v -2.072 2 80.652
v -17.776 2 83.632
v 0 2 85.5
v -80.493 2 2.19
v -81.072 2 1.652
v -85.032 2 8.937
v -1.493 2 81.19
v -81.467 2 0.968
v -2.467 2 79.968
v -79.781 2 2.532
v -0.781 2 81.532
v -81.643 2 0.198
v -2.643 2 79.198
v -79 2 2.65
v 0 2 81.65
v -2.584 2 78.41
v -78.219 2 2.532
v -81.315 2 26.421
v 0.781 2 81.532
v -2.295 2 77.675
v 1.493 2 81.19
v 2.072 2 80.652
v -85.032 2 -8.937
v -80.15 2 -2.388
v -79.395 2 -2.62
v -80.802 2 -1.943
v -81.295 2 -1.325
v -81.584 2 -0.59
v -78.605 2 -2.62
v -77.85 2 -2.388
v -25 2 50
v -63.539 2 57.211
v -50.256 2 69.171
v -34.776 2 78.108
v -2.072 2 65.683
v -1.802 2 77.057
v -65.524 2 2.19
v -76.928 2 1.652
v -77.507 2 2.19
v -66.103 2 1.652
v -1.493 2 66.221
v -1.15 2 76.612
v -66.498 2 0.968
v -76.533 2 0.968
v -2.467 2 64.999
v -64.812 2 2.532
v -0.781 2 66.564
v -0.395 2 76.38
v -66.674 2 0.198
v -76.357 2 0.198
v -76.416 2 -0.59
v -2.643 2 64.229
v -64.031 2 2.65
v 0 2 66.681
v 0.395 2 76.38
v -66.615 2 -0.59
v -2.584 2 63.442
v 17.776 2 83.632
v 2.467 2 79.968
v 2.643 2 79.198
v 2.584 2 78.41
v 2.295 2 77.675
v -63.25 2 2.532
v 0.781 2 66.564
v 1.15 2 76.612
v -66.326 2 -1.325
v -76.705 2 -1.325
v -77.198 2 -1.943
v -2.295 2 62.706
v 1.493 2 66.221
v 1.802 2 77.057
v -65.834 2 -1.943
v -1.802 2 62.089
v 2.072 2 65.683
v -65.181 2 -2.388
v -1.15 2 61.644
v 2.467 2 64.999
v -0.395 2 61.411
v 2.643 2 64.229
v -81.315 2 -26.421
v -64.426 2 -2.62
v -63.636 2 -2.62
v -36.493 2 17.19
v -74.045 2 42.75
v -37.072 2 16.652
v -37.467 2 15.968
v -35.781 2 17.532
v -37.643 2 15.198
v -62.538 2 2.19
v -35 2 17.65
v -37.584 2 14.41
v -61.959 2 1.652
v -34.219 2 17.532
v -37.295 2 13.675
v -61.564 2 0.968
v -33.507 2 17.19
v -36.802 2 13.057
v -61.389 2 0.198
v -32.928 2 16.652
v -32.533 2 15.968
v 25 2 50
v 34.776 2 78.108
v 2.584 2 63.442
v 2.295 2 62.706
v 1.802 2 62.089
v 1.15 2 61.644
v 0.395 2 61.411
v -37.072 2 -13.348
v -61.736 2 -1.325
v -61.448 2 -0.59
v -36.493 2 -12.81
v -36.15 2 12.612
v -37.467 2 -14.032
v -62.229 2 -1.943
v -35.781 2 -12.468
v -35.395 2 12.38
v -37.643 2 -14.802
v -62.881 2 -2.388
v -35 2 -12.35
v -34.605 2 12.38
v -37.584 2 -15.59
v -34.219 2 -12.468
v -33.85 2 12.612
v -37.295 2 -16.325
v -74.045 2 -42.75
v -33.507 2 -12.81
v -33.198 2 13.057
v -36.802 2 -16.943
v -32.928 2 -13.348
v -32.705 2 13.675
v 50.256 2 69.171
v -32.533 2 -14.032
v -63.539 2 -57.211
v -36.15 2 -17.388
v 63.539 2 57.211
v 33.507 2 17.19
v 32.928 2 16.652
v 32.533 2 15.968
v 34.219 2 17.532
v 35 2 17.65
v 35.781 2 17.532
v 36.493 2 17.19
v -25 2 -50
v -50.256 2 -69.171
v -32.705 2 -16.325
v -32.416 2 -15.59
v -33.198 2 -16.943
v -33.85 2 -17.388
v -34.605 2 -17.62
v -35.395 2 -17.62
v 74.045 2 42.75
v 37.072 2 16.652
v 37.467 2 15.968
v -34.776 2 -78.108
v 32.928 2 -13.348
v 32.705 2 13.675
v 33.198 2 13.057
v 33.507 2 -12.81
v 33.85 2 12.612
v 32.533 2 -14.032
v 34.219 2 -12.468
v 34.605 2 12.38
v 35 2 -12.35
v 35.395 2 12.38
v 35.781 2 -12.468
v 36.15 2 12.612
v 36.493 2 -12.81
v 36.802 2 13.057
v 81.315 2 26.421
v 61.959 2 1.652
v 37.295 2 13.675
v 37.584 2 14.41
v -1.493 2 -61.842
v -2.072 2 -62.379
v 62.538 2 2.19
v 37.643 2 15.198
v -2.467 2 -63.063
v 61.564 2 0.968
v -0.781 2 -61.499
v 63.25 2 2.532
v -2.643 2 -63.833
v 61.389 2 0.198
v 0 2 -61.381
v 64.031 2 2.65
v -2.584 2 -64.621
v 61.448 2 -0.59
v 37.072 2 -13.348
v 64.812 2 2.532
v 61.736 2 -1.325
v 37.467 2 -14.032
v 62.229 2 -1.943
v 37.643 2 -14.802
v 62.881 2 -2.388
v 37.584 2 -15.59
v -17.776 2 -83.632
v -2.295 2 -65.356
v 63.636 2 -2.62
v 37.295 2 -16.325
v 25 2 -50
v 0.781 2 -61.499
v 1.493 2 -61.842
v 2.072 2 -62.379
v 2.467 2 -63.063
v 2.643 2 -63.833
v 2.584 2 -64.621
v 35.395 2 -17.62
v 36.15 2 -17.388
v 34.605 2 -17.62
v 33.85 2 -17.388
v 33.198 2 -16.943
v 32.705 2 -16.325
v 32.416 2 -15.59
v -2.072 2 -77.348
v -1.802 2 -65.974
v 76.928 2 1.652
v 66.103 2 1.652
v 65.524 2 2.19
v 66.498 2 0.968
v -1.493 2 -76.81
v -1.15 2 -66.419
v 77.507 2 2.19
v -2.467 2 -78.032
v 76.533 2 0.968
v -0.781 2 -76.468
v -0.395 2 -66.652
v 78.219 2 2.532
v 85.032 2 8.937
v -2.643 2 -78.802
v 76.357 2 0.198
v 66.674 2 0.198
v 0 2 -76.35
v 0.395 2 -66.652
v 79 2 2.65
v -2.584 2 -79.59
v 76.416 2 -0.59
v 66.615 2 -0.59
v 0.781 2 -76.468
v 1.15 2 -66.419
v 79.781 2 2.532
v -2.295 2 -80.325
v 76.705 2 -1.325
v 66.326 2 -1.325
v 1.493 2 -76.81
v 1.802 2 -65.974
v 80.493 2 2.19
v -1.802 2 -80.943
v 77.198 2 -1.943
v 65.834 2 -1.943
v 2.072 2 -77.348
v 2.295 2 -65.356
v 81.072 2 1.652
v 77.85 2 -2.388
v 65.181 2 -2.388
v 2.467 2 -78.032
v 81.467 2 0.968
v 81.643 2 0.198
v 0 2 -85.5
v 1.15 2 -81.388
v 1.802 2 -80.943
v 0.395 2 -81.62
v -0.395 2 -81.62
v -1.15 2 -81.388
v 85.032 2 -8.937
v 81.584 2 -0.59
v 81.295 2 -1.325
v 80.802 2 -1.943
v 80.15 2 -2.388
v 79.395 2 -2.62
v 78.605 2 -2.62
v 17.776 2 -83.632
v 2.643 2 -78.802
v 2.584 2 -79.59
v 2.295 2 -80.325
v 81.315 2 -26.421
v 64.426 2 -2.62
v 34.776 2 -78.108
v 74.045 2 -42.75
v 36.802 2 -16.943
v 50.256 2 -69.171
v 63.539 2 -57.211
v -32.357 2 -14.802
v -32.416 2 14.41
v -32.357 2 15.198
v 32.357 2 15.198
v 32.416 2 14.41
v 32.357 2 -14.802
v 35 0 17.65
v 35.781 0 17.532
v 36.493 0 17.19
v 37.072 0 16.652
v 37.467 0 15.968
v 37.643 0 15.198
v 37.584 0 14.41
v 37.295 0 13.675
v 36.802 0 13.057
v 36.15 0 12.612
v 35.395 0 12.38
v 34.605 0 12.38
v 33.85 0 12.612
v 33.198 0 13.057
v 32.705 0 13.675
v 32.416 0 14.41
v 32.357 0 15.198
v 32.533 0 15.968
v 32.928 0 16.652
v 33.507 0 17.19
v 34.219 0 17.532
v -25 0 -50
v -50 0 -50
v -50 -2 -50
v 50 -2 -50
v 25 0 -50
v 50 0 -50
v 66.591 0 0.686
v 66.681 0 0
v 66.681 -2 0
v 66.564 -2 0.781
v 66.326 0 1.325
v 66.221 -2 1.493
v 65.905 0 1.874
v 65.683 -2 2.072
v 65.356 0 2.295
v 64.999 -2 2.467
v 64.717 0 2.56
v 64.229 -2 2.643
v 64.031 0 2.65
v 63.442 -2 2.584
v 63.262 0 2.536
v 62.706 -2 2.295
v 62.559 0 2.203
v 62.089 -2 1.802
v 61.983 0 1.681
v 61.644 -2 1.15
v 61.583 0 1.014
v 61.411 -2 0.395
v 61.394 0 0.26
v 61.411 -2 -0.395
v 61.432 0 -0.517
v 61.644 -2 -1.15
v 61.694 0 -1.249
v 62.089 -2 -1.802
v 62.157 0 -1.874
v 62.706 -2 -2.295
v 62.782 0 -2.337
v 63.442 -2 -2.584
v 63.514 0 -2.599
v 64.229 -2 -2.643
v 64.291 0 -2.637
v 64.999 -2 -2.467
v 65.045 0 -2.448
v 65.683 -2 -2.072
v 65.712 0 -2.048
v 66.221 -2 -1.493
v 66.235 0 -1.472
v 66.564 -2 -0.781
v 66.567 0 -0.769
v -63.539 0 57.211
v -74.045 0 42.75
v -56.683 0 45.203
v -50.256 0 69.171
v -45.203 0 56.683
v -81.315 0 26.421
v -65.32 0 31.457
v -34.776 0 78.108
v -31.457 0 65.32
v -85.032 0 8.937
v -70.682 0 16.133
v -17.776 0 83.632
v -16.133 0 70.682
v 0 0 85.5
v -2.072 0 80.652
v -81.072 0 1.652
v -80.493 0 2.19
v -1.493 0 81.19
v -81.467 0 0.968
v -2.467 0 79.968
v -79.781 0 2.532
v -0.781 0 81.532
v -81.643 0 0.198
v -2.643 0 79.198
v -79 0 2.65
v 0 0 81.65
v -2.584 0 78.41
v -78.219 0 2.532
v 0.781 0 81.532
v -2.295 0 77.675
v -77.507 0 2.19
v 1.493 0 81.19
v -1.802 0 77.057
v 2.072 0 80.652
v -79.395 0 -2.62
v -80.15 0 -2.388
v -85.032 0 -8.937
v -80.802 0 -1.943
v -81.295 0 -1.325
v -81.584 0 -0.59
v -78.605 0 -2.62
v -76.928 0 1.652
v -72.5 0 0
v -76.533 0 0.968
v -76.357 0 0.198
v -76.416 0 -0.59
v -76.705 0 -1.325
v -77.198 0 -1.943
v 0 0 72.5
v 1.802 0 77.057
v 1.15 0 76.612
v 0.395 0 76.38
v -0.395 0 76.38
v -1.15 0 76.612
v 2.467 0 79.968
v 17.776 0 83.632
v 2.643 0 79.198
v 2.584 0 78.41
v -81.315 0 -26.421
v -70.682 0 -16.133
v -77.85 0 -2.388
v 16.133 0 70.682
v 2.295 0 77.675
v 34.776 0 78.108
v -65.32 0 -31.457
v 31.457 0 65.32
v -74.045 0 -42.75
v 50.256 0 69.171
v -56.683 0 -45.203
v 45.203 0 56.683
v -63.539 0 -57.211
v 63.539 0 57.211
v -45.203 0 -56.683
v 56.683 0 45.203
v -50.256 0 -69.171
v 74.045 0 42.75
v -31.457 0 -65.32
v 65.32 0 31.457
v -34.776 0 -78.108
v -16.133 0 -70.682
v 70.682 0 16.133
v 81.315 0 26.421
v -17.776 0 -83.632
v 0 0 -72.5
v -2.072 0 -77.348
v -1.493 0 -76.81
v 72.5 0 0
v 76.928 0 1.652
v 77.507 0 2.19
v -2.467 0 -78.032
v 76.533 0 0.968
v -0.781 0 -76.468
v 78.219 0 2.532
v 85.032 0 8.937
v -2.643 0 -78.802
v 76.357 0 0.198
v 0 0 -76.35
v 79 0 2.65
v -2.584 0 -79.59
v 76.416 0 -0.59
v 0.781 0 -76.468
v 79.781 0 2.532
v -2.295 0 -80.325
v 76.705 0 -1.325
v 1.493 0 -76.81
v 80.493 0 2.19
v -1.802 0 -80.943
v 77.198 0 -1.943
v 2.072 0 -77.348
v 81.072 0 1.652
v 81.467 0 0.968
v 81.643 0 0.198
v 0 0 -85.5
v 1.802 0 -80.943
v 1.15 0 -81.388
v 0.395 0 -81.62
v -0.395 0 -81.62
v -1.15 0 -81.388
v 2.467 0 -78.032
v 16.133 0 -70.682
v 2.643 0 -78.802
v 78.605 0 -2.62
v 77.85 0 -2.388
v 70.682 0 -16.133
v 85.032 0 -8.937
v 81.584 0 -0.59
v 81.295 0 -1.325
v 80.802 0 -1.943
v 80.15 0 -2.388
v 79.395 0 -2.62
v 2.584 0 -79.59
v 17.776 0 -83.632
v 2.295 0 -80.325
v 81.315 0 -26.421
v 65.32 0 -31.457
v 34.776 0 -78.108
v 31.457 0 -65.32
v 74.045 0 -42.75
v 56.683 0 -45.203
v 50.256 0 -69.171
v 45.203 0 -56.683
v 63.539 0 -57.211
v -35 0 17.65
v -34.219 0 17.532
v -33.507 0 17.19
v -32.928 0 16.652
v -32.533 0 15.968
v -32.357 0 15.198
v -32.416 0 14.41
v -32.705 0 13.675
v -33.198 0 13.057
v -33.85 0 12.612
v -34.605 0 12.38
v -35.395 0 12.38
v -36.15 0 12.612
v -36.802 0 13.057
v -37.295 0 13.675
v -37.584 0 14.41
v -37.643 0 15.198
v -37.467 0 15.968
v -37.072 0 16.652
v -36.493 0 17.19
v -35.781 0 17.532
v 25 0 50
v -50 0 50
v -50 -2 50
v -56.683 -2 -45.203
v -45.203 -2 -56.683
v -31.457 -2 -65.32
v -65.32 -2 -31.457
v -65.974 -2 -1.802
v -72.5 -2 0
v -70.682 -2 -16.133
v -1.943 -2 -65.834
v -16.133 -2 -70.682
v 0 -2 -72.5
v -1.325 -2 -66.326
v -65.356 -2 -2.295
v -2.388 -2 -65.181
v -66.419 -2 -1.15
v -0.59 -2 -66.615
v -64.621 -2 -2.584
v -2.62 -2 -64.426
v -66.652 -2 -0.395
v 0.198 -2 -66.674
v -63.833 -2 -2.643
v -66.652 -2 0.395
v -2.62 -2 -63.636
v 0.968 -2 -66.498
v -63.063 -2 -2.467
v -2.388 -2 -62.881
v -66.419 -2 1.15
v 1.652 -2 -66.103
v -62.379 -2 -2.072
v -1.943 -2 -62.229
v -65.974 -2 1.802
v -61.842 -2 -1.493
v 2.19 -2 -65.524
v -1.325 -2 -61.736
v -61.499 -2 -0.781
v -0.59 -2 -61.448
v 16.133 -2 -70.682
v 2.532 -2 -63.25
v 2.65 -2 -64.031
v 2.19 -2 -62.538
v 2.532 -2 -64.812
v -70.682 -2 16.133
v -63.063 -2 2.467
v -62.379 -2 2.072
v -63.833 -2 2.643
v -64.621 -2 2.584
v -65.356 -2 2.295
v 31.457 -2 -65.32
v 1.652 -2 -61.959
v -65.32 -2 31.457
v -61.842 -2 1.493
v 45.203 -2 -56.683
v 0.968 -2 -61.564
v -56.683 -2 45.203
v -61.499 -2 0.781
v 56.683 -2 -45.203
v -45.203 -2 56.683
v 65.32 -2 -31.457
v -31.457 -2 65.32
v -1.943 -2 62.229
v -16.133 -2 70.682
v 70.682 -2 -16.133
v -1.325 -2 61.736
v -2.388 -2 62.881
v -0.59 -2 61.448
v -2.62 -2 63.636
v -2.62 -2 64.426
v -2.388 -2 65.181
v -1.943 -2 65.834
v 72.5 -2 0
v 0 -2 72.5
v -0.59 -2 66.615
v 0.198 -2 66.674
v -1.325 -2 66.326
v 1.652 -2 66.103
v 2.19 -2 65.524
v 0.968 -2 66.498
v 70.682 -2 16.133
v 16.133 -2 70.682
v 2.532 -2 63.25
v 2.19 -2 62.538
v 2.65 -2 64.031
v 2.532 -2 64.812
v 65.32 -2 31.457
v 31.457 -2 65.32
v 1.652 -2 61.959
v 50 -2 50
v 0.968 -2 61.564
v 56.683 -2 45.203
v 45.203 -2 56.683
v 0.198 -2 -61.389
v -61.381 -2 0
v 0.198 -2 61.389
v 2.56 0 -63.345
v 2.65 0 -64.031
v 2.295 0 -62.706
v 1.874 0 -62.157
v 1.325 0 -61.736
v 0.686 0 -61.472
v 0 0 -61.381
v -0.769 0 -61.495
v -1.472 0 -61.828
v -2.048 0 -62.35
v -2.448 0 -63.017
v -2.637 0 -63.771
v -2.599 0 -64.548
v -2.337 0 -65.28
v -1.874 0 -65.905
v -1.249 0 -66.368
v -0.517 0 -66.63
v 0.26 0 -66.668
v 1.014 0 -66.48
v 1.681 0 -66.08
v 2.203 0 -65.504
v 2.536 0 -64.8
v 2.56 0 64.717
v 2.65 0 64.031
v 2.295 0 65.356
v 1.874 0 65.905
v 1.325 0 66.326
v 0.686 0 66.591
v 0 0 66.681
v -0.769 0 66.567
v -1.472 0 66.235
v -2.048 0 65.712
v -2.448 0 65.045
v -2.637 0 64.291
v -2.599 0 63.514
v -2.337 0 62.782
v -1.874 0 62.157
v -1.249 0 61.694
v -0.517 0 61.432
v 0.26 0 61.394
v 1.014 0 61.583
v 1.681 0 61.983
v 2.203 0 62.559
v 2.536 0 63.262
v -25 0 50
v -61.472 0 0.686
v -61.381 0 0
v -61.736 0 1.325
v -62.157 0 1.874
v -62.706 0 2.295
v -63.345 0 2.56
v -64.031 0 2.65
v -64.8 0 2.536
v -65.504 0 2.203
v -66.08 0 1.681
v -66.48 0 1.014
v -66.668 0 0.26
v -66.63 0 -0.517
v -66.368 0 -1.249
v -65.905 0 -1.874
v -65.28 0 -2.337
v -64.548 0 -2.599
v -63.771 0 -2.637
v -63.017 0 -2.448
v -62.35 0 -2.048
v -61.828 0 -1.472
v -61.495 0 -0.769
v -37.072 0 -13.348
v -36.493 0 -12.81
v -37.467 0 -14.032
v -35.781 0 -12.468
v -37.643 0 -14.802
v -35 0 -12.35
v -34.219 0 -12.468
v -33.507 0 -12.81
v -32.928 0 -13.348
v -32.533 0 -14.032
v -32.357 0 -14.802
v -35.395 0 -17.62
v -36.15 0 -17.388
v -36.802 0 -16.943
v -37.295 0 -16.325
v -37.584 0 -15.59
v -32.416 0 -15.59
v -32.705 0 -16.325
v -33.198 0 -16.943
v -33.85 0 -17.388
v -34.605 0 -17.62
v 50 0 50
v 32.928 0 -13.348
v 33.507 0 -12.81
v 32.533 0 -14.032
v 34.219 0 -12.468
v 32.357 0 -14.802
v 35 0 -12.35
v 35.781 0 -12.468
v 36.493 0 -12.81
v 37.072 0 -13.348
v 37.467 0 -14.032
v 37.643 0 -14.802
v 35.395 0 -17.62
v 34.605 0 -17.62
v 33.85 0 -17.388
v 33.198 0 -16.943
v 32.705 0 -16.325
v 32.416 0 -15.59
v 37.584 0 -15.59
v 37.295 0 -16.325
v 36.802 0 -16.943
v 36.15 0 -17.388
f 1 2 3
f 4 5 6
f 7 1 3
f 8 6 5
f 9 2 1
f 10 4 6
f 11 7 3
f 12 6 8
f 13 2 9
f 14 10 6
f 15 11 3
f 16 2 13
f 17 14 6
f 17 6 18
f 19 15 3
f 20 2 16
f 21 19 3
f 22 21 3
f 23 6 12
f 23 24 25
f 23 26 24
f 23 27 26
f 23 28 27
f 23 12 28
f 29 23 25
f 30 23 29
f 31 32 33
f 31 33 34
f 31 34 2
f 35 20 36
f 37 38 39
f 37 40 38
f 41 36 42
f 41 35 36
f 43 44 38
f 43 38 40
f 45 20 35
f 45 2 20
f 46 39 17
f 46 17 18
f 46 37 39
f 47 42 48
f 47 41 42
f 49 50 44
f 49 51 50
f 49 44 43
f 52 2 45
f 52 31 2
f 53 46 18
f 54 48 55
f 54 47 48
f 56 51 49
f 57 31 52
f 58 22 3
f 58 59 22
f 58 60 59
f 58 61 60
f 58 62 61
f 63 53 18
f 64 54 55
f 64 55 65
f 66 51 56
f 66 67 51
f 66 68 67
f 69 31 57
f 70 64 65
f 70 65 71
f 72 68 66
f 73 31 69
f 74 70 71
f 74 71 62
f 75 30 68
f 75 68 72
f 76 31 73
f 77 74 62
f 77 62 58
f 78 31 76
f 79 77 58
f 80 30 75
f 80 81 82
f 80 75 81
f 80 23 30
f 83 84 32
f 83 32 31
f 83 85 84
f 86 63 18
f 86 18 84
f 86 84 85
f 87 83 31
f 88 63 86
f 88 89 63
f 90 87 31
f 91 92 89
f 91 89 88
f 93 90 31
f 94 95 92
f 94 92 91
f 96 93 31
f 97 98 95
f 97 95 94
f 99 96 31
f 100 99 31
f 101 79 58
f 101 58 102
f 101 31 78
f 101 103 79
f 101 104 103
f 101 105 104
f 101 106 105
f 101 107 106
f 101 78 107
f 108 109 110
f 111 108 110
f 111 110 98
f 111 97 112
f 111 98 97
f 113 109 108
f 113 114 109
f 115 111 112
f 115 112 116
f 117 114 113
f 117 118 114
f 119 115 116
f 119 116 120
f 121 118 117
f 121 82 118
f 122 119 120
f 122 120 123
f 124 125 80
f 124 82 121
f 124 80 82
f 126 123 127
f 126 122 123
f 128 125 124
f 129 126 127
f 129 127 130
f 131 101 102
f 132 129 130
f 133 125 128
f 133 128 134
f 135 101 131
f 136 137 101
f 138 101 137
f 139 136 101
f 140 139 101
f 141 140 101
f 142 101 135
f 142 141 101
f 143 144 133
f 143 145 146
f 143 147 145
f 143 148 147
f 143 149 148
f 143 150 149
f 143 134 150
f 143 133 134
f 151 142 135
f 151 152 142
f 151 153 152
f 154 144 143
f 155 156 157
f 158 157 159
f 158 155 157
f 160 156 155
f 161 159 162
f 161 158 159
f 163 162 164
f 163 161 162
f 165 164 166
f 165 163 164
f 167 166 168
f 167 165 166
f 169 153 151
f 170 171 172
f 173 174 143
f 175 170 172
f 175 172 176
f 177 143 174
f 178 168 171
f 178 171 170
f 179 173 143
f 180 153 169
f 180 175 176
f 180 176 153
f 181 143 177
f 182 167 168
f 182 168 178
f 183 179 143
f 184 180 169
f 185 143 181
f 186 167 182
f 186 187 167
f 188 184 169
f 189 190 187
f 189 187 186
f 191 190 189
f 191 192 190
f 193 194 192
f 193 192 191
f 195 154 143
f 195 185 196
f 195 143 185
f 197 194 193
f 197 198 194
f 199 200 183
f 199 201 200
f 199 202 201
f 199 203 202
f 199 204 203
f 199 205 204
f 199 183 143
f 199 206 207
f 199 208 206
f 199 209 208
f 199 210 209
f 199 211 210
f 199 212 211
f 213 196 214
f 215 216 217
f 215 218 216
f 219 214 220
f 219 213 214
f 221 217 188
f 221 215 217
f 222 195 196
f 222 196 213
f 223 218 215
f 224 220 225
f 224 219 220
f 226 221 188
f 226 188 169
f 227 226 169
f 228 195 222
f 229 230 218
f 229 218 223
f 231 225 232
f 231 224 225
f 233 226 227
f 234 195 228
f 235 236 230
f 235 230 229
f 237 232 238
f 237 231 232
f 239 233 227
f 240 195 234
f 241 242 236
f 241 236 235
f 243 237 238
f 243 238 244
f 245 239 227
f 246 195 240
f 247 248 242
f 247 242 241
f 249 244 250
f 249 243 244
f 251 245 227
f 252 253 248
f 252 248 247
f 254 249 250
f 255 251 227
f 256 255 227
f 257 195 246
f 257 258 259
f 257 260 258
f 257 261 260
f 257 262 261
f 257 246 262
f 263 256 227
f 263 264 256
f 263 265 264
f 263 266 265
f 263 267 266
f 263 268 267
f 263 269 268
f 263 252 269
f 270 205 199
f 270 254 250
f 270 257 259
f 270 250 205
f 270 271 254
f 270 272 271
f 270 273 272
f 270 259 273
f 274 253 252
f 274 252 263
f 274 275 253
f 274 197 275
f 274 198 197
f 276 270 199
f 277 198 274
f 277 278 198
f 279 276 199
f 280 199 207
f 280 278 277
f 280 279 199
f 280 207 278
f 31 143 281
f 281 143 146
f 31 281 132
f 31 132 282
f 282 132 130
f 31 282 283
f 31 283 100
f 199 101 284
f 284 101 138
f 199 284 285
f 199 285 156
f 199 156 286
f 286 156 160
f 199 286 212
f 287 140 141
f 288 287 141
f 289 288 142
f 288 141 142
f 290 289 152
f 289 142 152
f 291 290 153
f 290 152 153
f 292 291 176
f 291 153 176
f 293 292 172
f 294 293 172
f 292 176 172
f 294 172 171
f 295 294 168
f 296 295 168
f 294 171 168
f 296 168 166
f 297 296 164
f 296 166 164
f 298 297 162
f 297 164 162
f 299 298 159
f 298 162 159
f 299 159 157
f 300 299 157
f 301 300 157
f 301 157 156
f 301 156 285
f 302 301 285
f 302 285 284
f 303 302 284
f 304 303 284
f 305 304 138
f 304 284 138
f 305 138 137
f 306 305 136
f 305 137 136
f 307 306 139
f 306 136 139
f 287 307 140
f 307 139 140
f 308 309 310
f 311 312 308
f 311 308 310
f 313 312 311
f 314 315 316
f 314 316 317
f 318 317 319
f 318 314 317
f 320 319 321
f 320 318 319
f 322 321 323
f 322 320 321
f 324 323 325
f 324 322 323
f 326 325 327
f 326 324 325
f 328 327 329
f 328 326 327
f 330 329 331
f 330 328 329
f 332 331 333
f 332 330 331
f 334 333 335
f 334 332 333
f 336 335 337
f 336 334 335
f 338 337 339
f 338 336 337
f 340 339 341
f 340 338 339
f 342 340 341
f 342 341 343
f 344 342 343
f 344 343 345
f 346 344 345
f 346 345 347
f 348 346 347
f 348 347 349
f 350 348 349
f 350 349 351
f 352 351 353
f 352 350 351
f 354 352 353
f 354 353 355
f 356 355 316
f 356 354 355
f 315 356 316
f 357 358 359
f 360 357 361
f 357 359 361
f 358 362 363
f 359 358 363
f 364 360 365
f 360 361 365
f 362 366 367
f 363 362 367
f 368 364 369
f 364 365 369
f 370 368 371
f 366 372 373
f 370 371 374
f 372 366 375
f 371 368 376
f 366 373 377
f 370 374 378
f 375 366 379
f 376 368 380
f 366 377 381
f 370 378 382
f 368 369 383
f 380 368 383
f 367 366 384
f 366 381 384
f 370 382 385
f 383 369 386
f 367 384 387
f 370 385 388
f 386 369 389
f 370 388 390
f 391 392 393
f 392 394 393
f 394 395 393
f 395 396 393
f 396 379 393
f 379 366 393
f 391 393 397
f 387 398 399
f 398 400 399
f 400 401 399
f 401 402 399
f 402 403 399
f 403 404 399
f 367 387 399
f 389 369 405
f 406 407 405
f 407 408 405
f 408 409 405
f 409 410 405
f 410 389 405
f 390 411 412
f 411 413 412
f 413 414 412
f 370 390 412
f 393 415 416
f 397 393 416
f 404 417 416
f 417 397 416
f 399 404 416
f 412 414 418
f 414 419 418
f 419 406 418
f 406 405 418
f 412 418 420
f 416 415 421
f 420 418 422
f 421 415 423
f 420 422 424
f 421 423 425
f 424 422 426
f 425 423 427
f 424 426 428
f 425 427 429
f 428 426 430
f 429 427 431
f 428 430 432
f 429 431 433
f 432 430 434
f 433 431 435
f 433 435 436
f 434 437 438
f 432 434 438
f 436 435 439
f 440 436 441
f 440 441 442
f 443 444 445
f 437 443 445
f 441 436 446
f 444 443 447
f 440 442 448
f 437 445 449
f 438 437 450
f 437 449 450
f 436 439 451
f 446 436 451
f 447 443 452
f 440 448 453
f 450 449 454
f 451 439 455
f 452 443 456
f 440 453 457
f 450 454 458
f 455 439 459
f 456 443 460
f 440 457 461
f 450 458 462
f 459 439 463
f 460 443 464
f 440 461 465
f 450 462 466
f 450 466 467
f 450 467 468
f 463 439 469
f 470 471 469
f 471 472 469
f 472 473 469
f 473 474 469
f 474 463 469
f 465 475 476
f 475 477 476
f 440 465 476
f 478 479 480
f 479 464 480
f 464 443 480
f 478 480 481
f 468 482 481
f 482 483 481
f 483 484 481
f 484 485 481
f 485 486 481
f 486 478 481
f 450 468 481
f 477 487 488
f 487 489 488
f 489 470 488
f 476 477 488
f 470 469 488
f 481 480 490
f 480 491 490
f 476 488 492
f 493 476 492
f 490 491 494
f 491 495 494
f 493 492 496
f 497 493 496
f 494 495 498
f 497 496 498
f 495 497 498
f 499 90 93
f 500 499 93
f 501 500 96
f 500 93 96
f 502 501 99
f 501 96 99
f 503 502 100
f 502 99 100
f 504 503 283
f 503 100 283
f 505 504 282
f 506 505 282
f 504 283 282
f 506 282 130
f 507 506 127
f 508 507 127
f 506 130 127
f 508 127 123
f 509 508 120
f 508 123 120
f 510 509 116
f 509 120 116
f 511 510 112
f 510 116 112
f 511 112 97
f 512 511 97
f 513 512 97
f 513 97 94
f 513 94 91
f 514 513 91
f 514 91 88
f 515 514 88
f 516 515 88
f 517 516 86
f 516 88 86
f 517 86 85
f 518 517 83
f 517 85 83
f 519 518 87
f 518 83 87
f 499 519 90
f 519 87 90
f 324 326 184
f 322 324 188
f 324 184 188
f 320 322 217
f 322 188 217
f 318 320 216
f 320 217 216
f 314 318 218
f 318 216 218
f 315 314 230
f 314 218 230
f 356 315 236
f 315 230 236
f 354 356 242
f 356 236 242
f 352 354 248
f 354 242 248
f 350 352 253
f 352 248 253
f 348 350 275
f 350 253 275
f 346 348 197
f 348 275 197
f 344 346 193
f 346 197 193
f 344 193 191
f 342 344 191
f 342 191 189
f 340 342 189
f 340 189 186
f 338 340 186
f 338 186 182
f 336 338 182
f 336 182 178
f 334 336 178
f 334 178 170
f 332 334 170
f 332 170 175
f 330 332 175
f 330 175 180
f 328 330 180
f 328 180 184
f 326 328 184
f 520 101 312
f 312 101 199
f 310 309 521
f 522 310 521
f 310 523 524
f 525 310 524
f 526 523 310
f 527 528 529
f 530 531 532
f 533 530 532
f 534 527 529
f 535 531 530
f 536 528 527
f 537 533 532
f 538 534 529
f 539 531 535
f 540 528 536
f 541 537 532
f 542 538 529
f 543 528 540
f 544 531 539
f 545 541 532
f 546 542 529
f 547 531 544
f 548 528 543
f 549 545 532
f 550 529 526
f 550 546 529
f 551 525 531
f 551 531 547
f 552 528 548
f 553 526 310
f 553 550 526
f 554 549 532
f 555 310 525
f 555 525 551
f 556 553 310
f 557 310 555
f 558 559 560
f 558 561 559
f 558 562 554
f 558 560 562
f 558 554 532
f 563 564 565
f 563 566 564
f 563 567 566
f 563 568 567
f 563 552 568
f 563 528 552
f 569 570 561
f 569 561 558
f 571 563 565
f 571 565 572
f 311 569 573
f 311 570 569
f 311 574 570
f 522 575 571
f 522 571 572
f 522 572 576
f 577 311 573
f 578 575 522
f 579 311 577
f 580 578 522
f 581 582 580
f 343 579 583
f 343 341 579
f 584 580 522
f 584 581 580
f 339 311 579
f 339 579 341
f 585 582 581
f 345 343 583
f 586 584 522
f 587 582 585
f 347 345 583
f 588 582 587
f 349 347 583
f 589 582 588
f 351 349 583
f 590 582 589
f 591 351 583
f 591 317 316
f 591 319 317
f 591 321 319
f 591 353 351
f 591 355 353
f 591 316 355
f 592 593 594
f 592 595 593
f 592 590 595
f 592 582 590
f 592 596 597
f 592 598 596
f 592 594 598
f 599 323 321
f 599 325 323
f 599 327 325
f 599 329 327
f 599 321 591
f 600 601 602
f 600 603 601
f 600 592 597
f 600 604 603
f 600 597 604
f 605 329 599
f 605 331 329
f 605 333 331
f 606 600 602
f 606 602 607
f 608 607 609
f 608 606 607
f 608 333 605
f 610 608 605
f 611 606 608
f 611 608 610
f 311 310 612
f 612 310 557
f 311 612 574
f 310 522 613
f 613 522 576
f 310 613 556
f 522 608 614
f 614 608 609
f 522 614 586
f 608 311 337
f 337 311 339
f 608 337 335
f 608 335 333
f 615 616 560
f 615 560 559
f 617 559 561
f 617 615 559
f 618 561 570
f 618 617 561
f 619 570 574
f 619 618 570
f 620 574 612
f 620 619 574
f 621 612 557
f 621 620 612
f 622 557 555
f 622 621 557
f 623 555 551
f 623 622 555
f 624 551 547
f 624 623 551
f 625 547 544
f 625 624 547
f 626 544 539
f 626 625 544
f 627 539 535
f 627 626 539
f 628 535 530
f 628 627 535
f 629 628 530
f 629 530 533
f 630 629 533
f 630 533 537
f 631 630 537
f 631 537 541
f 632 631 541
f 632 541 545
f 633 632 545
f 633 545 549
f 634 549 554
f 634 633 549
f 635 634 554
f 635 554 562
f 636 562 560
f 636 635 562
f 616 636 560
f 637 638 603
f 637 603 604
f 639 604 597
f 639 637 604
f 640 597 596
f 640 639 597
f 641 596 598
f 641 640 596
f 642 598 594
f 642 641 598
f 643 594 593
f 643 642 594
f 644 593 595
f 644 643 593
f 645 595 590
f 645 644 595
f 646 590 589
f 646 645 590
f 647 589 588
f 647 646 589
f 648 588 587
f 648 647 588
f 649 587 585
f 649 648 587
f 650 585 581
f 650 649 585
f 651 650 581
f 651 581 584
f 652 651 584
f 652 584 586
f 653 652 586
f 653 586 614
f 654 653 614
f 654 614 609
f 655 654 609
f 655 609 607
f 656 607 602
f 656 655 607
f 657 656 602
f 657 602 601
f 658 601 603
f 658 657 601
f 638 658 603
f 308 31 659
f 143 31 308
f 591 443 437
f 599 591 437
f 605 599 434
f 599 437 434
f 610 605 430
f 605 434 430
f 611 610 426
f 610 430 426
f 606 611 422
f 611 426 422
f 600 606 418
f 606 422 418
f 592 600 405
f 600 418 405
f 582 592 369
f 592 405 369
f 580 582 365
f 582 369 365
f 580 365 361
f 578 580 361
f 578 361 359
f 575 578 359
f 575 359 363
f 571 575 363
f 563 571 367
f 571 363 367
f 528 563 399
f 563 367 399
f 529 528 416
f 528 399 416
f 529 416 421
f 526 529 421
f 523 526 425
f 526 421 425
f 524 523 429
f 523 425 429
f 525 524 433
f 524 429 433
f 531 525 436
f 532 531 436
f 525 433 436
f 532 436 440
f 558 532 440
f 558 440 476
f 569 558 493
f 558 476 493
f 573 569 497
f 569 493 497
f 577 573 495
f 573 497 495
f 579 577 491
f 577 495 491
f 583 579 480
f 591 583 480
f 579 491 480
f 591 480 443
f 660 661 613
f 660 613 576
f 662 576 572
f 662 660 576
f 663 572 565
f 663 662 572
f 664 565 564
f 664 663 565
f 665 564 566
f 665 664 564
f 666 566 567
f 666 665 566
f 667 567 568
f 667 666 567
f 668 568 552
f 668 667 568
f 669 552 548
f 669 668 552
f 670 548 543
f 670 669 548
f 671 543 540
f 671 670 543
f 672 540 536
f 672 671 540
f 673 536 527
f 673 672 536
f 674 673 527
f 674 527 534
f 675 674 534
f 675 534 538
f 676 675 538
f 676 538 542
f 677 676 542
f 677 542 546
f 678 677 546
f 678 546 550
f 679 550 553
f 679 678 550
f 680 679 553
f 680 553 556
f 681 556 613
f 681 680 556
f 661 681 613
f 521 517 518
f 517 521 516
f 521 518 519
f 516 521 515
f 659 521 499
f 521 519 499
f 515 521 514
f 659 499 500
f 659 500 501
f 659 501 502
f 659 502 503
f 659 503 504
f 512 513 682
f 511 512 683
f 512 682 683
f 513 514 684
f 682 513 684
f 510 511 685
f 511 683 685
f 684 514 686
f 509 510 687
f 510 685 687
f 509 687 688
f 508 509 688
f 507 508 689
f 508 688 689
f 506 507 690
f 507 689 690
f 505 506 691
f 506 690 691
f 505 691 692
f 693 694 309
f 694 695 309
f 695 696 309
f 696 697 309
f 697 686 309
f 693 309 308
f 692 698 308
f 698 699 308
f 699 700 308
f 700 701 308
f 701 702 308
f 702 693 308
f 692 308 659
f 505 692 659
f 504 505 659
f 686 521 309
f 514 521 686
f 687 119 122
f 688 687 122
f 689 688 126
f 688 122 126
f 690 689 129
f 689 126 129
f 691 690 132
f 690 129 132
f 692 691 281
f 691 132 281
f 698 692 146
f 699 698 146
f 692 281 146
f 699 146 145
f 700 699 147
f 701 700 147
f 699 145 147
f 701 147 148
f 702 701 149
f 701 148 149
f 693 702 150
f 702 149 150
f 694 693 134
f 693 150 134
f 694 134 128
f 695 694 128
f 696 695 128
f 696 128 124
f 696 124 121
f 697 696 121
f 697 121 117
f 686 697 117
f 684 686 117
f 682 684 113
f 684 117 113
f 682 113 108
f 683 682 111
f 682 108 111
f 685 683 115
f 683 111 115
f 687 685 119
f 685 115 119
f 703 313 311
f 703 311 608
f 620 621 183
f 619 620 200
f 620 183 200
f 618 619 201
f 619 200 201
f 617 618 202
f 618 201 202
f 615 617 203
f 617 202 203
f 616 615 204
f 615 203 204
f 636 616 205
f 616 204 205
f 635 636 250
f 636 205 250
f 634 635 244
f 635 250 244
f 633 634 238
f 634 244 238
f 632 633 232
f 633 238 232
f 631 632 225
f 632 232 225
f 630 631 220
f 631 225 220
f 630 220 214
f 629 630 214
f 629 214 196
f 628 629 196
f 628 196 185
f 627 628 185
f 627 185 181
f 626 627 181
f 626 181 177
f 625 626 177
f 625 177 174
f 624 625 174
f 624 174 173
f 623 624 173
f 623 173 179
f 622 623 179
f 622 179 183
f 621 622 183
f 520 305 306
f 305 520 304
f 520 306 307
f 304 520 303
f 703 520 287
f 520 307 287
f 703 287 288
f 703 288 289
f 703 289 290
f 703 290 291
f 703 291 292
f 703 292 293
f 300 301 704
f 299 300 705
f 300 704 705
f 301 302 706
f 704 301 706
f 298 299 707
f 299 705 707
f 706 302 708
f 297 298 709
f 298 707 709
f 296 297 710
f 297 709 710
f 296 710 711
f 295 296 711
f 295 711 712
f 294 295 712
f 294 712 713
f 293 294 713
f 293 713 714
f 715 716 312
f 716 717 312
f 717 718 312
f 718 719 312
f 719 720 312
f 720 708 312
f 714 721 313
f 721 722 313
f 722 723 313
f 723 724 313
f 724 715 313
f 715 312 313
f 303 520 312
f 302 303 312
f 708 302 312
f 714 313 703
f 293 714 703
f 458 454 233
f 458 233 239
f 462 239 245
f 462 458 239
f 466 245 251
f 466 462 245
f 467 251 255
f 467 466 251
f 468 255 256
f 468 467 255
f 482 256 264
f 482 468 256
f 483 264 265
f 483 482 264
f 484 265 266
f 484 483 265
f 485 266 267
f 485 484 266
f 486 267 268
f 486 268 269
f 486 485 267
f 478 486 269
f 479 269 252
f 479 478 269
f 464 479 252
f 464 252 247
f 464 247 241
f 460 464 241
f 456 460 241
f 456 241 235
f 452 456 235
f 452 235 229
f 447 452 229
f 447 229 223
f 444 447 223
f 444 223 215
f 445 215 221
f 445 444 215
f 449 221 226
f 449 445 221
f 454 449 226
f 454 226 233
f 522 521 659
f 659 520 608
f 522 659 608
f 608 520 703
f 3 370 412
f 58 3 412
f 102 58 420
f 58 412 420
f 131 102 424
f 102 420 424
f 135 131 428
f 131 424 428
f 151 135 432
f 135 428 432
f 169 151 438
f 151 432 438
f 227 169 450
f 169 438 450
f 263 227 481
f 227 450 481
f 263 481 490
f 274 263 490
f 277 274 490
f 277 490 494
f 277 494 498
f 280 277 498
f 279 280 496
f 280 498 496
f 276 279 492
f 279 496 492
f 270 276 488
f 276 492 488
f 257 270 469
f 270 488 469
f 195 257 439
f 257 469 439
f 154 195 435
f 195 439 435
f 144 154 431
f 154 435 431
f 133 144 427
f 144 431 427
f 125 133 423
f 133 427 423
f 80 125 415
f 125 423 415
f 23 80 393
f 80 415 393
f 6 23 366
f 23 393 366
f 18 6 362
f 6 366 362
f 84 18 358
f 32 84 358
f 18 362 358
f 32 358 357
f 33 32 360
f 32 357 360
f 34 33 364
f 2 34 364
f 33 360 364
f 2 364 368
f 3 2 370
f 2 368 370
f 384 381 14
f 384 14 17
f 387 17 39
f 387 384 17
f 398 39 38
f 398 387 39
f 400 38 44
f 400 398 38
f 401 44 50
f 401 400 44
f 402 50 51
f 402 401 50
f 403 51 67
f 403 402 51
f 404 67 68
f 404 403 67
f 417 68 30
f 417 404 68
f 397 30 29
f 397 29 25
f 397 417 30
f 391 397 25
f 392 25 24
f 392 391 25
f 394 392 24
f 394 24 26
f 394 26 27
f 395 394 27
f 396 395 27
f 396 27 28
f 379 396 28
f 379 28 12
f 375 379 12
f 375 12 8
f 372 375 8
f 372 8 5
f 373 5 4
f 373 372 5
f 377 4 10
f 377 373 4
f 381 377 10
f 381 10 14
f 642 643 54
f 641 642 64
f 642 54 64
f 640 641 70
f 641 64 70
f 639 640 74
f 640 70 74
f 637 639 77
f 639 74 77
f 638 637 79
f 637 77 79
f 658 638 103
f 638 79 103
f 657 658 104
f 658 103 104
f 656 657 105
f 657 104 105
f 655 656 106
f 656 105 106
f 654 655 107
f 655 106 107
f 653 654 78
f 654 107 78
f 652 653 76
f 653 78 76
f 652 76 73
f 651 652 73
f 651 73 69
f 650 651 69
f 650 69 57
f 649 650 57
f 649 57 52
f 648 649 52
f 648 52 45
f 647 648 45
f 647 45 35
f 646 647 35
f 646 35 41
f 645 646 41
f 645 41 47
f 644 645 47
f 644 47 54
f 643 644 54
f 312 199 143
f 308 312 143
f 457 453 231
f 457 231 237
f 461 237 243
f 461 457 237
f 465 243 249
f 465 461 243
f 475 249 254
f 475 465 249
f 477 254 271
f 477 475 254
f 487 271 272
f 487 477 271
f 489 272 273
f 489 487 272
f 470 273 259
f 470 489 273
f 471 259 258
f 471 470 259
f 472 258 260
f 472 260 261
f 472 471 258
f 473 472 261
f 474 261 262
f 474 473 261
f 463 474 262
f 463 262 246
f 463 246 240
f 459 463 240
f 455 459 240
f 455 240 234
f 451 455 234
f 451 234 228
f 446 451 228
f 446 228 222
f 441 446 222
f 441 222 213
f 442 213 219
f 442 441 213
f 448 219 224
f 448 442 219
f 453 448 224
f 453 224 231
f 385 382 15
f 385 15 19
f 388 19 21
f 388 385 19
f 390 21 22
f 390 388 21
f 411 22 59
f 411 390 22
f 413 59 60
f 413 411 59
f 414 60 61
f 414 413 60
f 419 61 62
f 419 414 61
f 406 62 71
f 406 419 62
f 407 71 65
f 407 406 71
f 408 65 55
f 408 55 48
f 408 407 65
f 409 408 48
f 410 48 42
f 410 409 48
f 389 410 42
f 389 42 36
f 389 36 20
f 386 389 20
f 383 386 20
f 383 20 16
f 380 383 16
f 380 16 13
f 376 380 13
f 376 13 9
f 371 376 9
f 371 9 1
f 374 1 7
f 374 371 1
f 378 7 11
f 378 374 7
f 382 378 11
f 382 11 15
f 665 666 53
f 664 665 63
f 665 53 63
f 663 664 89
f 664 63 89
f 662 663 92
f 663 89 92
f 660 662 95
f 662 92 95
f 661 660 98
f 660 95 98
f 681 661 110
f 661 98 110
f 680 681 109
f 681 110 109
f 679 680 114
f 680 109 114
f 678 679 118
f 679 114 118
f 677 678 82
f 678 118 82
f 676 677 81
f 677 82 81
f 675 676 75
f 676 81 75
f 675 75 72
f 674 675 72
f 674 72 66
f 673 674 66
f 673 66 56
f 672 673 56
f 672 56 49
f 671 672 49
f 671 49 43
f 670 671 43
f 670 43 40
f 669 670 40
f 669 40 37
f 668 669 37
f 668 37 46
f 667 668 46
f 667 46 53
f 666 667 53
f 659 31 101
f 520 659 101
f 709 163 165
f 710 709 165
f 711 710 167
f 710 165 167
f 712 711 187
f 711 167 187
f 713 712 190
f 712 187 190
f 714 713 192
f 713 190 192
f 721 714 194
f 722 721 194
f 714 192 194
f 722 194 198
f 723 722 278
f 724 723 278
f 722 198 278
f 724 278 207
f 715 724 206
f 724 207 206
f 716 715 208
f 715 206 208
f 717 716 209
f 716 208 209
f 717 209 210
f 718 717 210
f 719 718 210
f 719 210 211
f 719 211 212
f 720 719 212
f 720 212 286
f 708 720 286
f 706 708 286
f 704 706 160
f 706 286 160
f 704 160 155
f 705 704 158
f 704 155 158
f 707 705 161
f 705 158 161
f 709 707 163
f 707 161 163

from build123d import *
from build123d.topology import SkipClean

# Parameters (mm, degrees)
SKETCH_1_R            = 85.5
SKETCH_1_R_2          = 2.65
EXTRUDE_1_DEPTH       = 2
SKETCH_2_W            = 40
SKETCH_2_H            = 100
CUT_EXTRUDE_2_DEPTH   = 2
SKETCH_4_R            = 2.65
CUT_EXTRUDE_3_DEPTH   = 2
SKETCH_5_W            = 15
SKETCH_5_H            = 100
EXTRUDE_2_DEPTH       = 2
SKETCH_7_R            = 2.65
CUT_EXTRUDE_4_DEPTH   = 2
EXTRUDE_4_OUTLINE_R   = 72.5
EXTRUDE_4_OUTLINE_R_2 = 2.65
EXTRUDE_4_OUTLINE_W   = 100
EXTRUDE_4_OUTLINE_H   = 100
EXTRUDE_4_DEPTH       = 2


# Read off the part's stored shape, not the designer's step: 凸台-拉伸4
with BuildPart() as part:
    # 草图1 → 凸台-拉伸1 (new body)
    with BuildSketch(Plane(origin=(0, 0, 0), x_dir=(1, 0, 0), z_dir=(0, 1, 0))):
        with Locations(Location((0, 0, 0), (0, 0, 270))):
            Circle(SKETCH_1_R)
        with Locations(Location((0, 79, 0), (0, 0, 270))):
            Circle(SKETCH_1_R_2, mode=Mode.SUBTRACT)
        with Locations(Location((79, 0, 0), (0, 0, 270))):
            Circle(SKETCH_1_R_2, mode=Mode.SUBTRACT)
        with Locations(Location((0, -79, 0), (0, 0, 270))):
            Circle(SKETCH_1_R_2, mode=Mode.SUBTRACT)
        with Locations(Location((-79, 0, 0), (0, 0, 270))):
            Circle(SKETCH_1_R_2, mode=Mode.SUBTRACT)
    extrude(amount=EXTRUDE_1_DEPTH)

    # 草图2 → 切除-拉伸2 (cut)
    with BuildSketch(Plane(origin=(0, 2, 0), x_dir=(1, 0, 0), z_dir=(0, 1, 0))):
        with Locations((-20, 0)):
            Rectangle(SKETCH_2_W, SKETCH_2_H)
        with Locations((20, 0)):
            Rectangle(SKETCH_2_W, SKETCH_2_H)
    extrude(amount=-CUT_EXTRUDE_2_DEPTH, mode=Mode.SUBTRACT)

    # 草图4 → 切除-拉伸3 (cut)
    with BuildSketch(Plane(origin=(0, 2, 0), x_dir=(1, 0, 0), z_dir=(0, 1, 0))):
        with Locations(Location((0, 64.031242374, 0), (0, 0, 270))):
            Circle(SKETCH_4_R)
        with Locations(Location((64.031242374, 0, 0), (0, 0, 270))):
            Circle(SKETCH_4_R)
        with Locations(Location((0, -64.031242374, 0), (0, 0, 270))):
            Circle(SKETCH_4_R)
        with Locations(Location((-64.031242374, 0, 0), (0, 0, 270))):
            Circle(SKETCH_4_R)
    extrude(amount=-CUT_EXTRUDE_3_DEPTH, mode=Mode.SUBTRACT)

    # 草图5 → 凸台-拉伸2 (add)
    with BuildSketch(Plane(origin=(0, 2, 0), x_dir=(1, 0, 0), z_dir=(0, 1, 0))):
        with Locations((-32.5, 0)):
            Rectangle(SKETCH_5_W, SKETCH_5_H)
        with Locations((32.5, 0)):
            Rectangle(SKETCH_5_W, SKETCH_5_H)
    extrude(amount=-EXTRUDE_2_DEPTH)

    # 草图7 → 切除-拉伸4 (cut)
    with BuildSketch(Plane(origin=(0, 2, 0), x_dir=(1, 0, 0), z_dir=(0, 1, 0))):
        with Locations(Location((35, 15, 0), (0, 0, 270))):
            Circle(SKETCH_7_R)
        with Locations(Location((35, -15, 0), (0, 0, 270))):
            Circle(SKETCH_7_R)
        with Locations(Location((-35, -15, 0), (0, 0, 270))):
            Circle(SKETCH_7_R)
        with Locations(Location((-35, 15, 0), (0, 0, 270))):
            Circle(SKETCH_7_R)
    extrude(amount=-CUT_EXTRUDE_4_DEPTH, mode=Mode.SUBTRACT)

    # 凸台-拉伸4 outline → 凸台-拉伸4 (add)
    with SkipClean():  # the faces are left unmerged after this step: merging them gives an invalid solid
        with BuildSketch(Plane.XZ):
            Circle(EXTRUDE_4_OUTLINE_R)
            with Locations((0, -64.031242374)):
                Circle(EXTRUDE_4_OUTLINE_R_2, mode=Mode.SUBTRACT)
            with Locations((-64.031242374, 0)):
                Circle(EXTRUDE_4_OUTLINE_R_2, mode=Mode.SUBTRACT)
            Rectangle(EXTRUDE_4_OUTLINE_W, EXTRUDE_4_OUTLINE_H, mode=Mode.SUBTRACT)
            with Locations((64.031242374, 0)):
                Circle(EXTRUDE_4_OUTLINE_R_2, mode=Mode.SUBTRACT)
            with Locations((0, 64.031242374)):
                Circle(EXTRUDE_4_OUTLINE_R_2, mode=Mode.SUBTRACT)
        extrude(amount=EXTRUDE_4_DEPTH)
    add(part.part.scale(1), mode=Mode.REPLACE)  # the faces are merged on a copy


solid = part.part
